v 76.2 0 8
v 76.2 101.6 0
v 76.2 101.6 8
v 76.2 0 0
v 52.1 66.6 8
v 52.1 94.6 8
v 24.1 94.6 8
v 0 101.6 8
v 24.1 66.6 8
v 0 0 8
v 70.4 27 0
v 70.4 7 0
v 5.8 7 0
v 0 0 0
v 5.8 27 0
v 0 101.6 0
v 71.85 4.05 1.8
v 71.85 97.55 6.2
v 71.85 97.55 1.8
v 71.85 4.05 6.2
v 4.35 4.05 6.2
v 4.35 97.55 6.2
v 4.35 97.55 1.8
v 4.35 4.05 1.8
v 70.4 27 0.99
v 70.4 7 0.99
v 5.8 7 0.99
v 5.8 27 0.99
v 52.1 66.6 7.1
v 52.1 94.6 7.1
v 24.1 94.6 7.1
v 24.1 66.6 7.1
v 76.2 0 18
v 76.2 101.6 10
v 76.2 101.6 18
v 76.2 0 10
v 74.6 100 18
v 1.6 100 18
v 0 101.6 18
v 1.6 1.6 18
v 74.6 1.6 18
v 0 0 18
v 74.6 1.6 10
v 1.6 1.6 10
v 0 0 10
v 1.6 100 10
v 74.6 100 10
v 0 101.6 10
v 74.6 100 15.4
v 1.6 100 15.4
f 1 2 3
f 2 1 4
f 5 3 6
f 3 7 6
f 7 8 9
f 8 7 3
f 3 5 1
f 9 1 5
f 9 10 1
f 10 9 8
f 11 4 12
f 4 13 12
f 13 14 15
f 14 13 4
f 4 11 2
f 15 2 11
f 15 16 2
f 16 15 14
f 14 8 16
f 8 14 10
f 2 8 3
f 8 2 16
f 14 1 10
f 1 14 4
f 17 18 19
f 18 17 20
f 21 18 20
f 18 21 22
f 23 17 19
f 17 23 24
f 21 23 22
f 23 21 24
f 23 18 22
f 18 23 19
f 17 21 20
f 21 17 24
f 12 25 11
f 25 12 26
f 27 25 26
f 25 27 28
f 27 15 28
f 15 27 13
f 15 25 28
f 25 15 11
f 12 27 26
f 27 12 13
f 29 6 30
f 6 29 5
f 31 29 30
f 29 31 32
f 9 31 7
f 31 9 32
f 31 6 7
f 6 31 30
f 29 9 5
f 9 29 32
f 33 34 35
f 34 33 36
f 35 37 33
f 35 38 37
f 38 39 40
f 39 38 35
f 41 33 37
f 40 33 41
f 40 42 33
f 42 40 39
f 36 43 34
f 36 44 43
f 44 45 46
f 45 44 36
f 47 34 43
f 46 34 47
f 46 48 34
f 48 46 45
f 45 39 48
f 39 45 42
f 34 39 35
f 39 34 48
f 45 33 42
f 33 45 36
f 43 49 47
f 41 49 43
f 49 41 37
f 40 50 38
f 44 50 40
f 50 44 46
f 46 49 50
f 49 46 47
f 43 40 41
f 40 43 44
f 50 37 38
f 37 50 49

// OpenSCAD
// =============================================
// HoloCase V2 - Premium Rigid Card Case
// For HOLOTracker
// Fits standard 3x4 top loader binder pages
// =============================================

/* [Render Mode] */
// "base", "lid", or "both"
render_what = "both";   

/* [Main Dimensions] */
case_width      = 76.2;   // 3 inches
case_height     = 101.6;  // 4 inches
case_thickness  = 8.0;    // Overall thickness (~0.315")

/* [Card Cavity] */
card_width      = 66.5;   // Card + sleeve width
card_height     = 92.5;   // Card + sleeve height
card_thickness  = 2.4;    // Penny sleeve + card
clearance       = 0.5;    // Adjust this after first print (0.4–0.7 recommended)

/* [Lid & Overlap] */
lid_overlap     = 4.5;    // How deep the lid sits over the base (bigger = better hold)
wall_thickness  = 1.8;    // Thicker = more rigid/premium feel

/* [Features] */
label_recess_depth = 0.9;
qr_recess_depth    = 0.9;
qr_size            = 28;

/* [Advanced] */
lid_wall_thickness = 1.6;

module base() {
    difference() {
        // Main body
        cube([case_width, case_height, case_thickness]);
        
        // Card cavity
        translate([
            (case_width - card_width - clearance*2)/2,
            (case_height - card_height - clearance*2)/2,
            wall_thickness
        ])
        cube([
            card_width + clearance*2,
            card_height + clearance*2,
            card_thickness + 2
        ]);
        
        // Label recess (front bottom)
        translate([wall_thickness + 4, 7, -0.01])
        cube([case_width - wall_thickness*2 - 8, 20, label_recess_depth + 0.1]);
        
        // QR recess (back)
        translate([
            (case_width - qr_size)/2,
            case_height - qr_size - 7,
            case_thickness - qr_recess_depth
        ])
        cube([qr_size, qr_size, qr_recess_depth + 0.1]);
    }
}

module lid() {
    difference() {
        // Outer lid
        cube([case_width, case_height, case_thickness]);
        
        // Inner cavity that fits over base
        translate([wall_thickness - 0.2, wall_thickness - 0.2, -0.1])
        cube([
            case_width - wall_thickness*2 + 0.4,
            case_height - wall_thickness*2 + 0.4,
            lid_overlap + 1
        ]);
        
        // Make lid walls thinner on top for weight
        translate([lid_wall_thickness, lid_wall_thickness, lid_overlap])
        cube([
            case_width - lid_wall_thickness*2,
            case_height - lid_wall_thickness*2,
            case_thickness
        ]);
    }
}

// Render
if (render_what == "base" || render_what == "both") {
    base();
}

if (render_what == "lid" || render_what == "both") {
    translate([0, 0, case_thickness + 2])   // Offset so they don't overlap when rendering both
    lid();
}
